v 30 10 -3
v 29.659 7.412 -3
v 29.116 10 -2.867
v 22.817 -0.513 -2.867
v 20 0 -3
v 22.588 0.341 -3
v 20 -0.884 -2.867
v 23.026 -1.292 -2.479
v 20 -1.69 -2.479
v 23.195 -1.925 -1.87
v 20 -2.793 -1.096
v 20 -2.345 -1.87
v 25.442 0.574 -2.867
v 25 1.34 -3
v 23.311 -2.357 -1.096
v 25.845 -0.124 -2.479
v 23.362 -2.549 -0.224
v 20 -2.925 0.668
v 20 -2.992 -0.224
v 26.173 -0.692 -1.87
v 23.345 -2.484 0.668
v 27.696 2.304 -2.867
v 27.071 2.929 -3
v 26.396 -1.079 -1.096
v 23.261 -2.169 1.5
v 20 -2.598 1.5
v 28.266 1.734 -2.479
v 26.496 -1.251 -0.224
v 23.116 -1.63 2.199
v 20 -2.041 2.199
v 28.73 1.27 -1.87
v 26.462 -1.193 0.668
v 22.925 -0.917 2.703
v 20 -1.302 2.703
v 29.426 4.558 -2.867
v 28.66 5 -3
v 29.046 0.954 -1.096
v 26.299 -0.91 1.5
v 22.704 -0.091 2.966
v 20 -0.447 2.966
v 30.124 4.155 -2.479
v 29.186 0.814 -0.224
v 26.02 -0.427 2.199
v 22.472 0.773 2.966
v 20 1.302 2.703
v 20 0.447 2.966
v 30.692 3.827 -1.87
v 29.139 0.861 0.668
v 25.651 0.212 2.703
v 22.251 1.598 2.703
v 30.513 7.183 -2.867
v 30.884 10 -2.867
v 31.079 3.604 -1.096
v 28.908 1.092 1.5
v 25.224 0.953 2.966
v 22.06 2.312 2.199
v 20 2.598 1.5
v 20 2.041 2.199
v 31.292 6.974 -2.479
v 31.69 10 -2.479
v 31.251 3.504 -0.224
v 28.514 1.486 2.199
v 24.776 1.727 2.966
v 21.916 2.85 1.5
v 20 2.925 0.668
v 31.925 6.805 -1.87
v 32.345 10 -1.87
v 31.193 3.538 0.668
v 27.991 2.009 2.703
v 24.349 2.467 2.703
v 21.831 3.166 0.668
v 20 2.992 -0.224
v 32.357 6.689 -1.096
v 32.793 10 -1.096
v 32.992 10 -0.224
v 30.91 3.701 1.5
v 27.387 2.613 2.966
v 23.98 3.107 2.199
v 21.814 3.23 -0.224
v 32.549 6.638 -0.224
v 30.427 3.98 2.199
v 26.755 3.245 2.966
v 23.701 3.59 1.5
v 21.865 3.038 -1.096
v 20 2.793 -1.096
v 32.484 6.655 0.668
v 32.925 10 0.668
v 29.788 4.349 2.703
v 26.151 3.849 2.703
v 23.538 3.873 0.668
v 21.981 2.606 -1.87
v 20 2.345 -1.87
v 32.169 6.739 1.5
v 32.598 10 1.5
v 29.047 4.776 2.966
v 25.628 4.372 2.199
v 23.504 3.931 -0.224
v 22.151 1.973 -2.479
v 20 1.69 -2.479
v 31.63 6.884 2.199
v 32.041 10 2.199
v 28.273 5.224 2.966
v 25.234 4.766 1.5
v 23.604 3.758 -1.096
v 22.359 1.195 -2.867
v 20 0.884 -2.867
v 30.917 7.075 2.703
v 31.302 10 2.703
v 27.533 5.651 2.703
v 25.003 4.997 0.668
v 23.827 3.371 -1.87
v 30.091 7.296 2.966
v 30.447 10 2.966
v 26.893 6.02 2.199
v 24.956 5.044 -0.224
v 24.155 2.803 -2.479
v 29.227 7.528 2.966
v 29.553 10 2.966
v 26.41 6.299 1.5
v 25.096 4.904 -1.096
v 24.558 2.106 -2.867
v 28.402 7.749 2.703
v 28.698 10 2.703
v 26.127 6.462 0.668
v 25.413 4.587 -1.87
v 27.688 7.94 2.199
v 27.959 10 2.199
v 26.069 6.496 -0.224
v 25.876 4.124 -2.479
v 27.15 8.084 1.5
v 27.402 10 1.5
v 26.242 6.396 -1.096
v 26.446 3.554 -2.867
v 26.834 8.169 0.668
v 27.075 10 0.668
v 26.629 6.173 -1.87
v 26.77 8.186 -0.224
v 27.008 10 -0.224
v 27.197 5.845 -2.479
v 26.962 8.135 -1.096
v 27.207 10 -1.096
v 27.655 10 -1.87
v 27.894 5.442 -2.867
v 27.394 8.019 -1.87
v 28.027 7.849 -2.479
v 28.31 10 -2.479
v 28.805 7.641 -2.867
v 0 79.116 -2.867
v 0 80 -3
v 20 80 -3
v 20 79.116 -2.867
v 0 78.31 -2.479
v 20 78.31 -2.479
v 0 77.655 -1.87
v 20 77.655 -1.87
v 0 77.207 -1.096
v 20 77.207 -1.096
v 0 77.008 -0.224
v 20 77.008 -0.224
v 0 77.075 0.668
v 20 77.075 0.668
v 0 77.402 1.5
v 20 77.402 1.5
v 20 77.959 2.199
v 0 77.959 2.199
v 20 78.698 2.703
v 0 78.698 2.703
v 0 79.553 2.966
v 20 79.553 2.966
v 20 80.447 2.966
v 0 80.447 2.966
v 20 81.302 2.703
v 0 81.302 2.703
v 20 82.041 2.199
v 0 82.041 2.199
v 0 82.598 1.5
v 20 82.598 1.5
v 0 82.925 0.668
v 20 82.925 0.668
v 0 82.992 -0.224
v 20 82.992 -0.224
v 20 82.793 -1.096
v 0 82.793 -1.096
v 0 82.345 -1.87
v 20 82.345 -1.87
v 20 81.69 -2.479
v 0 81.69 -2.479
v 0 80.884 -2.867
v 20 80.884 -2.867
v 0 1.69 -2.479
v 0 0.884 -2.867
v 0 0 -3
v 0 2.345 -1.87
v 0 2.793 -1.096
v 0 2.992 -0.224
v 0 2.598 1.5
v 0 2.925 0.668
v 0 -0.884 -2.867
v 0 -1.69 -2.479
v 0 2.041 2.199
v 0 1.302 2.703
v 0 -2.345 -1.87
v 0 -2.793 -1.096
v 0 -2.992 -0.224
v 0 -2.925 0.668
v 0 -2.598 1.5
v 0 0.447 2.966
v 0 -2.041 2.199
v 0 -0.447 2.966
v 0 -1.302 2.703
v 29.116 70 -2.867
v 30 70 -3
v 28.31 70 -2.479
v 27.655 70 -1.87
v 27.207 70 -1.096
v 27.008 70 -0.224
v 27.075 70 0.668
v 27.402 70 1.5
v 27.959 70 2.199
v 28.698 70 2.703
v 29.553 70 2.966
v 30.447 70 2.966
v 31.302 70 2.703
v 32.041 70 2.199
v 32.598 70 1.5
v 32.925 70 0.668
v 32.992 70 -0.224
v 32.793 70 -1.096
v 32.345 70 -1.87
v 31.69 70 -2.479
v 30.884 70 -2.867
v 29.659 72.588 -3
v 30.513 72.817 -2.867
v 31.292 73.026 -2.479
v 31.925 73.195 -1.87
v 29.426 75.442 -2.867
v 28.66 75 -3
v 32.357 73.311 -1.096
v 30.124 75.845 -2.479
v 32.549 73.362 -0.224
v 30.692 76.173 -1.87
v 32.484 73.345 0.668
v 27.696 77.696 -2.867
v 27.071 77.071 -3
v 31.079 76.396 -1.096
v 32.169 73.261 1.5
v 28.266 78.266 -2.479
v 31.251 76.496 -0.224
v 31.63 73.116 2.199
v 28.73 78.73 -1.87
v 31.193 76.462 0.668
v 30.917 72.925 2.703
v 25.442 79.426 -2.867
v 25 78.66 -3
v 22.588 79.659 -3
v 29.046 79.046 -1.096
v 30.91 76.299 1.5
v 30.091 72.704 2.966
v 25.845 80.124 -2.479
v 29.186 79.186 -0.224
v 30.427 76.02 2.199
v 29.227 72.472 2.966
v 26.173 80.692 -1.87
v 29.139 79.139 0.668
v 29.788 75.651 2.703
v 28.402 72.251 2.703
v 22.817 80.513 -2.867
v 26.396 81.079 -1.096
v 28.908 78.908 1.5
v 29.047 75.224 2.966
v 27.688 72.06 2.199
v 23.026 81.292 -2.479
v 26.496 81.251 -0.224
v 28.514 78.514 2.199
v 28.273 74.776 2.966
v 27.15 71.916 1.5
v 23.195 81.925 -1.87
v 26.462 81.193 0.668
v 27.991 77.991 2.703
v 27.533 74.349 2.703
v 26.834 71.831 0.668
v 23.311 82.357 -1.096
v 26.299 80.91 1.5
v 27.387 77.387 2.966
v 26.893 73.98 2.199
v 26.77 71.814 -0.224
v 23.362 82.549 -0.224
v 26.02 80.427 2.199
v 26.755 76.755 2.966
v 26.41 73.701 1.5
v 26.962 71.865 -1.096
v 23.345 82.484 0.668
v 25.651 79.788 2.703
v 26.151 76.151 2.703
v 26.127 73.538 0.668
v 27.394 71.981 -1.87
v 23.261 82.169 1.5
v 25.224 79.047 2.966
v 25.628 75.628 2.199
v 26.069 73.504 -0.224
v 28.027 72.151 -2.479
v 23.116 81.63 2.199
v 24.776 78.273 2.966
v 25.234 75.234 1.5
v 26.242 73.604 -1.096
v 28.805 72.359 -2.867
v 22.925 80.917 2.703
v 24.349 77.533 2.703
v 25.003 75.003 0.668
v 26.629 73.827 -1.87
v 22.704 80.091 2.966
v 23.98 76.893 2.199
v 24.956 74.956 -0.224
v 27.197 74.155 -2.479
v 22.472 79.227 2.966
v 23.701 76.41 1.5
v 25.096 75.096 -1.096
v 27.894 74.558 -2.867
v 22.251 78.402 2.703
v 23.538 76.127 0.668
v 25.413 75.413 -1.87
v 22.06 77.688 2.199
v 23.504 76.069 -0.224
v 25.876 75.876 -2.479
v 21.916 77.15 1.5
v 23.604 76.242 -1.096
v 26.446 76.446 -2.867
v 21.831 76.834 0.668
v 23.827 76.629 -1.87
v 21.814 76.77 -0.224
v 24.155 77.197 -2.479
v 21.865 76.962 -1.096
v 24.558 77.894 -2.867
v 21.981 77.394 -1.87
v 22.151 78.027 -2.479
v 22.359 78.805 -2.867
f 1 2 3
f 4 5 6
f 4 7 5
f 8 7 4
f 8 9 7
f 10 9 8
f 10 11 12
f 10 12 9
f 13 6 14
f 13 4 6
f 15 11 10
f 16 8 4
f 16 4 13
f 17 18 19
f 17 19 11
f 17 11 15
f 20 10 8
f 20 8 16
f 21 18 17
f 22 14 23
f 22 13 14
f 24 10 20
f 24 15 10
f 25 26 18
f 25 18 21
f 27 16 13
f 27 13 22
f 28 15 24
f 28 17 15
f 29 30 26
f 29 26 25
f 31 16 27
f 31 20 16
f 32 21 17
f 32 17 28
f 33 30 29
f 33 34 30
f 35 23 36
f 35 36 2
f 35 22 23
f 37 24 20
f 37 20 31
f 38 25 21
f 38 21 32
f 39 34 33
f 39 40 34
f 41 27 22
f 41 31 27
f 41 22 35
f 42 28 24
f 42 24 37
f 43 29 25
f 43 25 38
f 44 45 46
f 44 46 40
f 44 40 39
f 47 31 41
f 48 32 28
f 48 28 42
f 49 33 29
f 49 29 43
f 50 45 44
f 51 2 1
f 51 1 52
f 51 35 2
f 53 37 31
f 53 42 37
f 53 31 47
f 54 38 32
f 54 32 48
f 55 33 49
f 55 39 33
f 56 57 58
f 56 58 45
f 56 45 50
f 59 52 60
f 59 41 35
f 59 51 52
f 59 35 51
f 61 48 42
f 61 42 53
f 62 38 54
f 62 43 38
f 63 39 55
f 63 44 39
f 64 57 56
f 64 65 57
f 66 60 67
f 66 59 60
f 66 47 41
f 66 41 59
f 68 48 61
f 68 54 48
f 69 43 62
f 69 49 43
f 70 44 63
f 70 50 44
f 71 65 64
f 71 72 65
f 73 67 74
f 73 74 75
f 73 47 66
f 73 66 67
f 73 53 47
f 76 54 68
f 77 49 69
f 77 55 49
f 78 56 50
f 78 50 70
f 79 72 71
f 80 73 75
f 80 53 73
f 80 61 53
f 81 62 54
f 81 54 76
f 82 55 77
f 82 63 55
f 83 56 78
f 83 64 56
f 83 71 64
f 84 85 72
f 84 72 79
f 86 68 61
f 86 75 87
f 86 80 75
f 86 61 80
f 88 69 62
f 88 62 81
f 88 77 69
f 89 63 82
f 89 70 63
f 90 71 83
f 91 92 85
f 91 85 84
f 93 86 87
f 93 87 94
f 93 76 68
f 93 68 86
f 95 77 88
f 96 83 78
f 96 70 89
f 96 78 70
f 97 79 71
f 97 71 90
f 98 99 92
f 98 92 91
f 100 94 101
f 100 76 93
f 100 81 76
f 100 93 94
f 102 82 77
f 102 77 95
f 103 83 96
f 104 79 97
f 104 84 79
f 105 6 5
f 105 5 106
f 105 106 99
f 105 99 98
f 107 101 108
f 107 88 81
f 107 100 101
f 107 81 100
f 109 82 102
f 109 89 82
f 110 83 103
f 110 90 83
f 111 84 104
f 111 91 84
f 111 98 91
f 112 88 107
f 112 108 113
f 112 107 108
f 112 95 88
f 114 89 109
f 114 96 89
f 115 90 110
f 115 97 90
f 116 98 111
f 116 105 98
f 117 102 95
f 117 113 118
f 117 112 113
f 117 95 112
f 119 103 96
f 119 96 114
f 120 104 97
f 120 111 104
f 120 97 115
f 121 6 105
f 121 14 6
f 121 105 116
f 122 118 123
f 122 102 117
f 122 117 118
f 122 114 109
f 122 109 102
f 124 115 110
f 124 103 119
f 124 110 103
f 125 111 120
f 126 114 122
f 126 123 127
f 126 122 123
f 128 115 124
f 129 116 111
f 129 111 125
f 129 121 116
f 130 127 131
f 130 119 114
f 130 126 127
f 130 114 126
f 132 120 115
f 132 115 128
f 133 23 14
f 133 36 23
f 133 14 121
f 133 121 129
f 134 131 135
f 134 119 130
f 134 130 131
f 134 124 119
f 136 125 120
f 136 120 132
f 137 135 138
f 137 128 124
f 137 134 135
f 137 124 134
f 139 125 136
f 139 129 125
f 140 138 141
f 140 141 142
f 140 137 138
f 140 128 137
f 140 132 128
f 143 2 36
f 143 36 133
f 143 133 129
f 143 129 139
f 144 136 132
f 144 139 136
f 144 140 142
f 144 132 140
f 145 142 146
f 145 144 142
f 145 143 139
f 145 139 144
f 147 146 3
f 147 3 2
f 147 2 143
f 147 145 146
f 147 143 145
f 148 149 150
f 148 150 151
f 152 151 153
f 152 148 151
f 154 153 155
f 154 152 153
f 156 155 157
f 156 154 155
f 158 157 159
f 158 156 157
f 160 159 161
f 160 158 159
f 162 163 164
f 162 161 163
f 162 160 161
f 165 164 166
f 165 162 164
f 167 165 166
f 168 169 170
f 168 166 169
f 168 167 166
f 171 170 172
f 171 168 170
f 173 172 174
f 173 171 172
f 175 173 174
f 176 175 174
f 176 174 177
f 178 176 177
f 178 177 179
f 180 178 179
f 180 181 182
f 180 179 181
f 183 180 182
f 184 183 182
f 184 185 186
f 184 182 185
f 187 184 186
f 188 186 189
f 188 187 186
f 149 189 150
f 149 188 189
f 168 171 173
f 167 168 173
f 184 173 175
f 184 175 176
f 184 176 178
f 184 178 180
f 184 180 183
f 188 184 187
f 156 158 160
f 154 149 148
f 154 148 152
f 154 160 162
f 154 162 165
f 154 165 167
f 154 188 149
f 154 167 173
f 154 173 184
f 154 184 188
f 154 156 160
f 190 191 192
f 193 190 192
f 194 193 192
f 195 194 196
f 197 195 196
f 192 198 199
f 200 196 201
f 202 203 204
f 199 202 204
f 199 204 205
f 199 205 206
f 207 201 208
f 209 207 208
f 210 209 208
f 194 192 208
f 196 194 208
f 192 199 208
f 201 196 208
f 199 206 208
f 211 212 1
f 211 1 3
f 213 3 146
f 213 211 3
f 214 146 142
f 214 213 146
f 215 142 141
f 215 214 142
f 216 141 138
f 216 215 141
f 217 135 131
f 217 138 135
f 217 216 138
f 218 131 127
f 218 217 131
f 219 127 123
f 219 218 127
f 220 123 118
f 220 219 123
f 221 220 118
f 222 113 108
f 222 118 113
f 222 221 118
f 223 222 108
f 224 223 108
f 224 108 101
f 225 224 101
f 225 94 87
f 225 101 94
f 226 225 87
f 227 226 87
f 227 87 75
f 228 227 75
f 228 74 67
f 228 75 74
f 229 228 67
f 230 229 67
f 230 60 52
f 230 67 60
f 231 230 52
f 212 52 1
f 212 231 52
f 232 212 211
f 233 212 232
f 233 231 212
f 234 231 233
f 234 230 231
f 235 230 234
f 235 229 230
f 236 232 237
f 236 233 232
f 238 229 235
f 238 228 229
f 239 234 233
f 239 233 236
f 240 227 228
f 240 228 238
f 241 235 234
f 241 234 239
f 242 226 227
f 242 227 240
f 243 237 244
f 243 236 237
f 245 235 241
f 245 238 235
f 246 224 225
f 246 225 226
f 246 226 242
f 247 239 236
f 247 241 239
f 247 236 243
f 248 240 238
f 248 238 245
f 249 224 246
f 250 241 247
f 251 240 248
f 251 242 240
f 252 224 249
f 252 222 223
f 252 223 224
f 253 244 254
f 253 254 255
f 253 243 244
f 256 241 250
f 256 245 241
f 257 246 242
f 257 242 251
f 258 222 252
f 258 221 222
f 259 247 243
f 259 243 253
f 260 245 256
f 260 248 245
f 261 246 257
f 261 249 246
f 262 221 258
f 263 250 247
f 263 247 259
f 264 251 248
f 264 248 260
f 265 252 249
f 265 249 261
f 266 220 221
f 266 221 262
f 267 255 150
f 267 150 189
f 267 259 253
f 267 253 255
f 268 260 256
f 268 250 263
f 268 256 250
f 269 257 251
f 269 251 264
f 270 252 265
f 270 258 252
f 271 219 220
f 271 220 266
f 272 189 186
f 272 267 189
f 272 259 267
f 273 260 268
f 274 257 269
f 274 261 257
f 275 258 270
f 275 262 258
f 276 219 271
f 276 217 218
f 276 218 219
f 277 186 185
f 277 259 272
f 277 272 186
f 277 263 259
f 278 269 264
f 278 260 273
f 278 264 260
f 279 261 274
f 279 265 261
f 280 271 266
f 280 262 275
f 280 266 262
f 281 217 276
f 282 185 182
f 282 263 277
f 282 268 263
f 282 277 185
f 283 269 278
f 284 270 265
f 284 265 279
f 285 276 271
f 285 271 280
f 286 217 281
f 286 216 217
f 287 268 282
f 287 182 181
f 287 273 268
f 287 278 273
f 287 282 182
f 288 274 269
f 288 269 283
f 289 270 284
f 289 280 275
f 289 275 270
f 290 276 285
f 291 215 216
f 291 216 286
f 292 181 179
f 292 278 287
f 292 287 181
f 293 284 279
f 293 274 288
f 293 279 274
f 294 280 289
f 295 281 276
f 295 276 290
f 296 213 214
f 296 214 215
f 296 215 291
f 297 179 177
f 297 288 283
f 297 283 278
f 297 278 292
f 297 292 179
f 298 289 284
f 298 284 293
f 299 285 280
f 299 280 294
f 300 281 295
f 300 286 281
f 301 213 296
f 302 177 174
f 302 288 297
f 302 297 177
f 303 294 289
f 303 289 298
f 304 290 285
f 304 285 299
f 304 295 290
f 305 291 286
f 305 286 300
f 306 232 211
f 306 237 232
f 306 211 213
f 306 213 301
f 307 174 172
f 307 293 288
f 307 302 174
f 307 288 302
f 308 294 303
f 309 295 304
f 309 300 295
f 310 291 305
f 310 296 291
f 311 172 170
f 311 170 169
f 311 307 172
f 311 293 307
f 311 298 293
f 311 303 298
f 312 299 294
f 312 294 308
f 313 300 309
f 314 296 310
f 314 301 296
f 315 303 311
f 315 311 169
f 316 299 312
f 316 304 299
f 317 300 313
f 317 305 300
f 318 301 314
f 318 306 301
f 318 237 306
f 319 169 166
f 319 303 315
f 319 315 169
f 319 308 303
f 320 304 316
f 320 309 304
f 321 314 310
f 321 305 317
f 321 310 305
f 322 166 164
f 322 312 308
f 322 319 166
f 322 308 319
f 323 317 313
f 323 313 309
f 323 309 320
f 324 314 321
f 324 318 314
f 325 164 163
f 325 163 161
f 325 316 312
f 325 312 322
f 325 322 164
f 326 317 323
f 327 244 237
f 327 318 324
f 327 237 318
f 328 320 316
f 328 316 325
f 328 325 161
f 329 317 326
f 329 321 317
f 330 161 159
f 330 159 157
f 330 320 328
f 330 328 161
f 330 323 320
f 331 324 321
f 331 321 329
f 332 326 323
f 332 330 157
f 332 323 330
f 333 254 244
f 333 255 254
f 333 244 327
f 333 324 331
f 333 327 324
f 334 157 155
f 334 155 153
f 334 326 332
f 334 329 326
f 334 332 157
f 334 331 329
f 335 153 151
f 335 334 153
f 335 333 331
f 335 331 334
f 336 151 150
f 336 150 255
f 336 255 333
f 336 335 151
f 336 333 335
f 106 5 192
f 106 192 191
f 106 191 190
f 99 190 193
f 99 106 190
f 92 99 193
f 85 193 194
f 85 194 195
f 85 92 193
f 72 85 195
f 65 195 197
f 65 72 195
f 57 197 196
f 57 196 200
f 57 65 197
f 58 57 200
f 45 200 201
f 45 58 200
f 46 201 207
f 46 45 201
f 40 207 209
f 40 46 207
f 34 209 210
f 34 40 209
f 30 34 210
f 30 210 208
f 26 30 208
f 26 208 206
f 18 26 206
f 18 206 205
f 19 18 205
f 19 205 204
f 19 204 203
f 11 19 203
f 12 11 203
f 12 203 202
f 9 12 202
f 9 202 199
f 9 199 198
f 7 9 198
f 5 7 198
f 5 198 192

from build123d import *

# Parameters (mm, degrees)
IZIM2_R = 3


with BuildPart() as part:
    # Süpür1: sweep along a path in Çizim1
    with BuildLine(Plane.XY) as s_p_r1_path:
        Line((0, 0), (20, 0))
        ThreePointArc((20, 0), (27.071067812, 2.928932188), (30, 10))
        Line((30, 10), (30, 70))
        ThreePointArc((30, 70), (27.071067812, 77.071067812), (20, 80))
        Line((20, 80), (0, 80))
    # Çizim2 → Süpür1 (sweep)
    with BuildSketch(Plane(origin=(0, 0, 0), x_dir=(0, 0, -1), z_dir=(1, 0, 0))):
        Circle(IZIM2_R)
    sweep(path=s_p_r1_path.line)


solid = part.part
